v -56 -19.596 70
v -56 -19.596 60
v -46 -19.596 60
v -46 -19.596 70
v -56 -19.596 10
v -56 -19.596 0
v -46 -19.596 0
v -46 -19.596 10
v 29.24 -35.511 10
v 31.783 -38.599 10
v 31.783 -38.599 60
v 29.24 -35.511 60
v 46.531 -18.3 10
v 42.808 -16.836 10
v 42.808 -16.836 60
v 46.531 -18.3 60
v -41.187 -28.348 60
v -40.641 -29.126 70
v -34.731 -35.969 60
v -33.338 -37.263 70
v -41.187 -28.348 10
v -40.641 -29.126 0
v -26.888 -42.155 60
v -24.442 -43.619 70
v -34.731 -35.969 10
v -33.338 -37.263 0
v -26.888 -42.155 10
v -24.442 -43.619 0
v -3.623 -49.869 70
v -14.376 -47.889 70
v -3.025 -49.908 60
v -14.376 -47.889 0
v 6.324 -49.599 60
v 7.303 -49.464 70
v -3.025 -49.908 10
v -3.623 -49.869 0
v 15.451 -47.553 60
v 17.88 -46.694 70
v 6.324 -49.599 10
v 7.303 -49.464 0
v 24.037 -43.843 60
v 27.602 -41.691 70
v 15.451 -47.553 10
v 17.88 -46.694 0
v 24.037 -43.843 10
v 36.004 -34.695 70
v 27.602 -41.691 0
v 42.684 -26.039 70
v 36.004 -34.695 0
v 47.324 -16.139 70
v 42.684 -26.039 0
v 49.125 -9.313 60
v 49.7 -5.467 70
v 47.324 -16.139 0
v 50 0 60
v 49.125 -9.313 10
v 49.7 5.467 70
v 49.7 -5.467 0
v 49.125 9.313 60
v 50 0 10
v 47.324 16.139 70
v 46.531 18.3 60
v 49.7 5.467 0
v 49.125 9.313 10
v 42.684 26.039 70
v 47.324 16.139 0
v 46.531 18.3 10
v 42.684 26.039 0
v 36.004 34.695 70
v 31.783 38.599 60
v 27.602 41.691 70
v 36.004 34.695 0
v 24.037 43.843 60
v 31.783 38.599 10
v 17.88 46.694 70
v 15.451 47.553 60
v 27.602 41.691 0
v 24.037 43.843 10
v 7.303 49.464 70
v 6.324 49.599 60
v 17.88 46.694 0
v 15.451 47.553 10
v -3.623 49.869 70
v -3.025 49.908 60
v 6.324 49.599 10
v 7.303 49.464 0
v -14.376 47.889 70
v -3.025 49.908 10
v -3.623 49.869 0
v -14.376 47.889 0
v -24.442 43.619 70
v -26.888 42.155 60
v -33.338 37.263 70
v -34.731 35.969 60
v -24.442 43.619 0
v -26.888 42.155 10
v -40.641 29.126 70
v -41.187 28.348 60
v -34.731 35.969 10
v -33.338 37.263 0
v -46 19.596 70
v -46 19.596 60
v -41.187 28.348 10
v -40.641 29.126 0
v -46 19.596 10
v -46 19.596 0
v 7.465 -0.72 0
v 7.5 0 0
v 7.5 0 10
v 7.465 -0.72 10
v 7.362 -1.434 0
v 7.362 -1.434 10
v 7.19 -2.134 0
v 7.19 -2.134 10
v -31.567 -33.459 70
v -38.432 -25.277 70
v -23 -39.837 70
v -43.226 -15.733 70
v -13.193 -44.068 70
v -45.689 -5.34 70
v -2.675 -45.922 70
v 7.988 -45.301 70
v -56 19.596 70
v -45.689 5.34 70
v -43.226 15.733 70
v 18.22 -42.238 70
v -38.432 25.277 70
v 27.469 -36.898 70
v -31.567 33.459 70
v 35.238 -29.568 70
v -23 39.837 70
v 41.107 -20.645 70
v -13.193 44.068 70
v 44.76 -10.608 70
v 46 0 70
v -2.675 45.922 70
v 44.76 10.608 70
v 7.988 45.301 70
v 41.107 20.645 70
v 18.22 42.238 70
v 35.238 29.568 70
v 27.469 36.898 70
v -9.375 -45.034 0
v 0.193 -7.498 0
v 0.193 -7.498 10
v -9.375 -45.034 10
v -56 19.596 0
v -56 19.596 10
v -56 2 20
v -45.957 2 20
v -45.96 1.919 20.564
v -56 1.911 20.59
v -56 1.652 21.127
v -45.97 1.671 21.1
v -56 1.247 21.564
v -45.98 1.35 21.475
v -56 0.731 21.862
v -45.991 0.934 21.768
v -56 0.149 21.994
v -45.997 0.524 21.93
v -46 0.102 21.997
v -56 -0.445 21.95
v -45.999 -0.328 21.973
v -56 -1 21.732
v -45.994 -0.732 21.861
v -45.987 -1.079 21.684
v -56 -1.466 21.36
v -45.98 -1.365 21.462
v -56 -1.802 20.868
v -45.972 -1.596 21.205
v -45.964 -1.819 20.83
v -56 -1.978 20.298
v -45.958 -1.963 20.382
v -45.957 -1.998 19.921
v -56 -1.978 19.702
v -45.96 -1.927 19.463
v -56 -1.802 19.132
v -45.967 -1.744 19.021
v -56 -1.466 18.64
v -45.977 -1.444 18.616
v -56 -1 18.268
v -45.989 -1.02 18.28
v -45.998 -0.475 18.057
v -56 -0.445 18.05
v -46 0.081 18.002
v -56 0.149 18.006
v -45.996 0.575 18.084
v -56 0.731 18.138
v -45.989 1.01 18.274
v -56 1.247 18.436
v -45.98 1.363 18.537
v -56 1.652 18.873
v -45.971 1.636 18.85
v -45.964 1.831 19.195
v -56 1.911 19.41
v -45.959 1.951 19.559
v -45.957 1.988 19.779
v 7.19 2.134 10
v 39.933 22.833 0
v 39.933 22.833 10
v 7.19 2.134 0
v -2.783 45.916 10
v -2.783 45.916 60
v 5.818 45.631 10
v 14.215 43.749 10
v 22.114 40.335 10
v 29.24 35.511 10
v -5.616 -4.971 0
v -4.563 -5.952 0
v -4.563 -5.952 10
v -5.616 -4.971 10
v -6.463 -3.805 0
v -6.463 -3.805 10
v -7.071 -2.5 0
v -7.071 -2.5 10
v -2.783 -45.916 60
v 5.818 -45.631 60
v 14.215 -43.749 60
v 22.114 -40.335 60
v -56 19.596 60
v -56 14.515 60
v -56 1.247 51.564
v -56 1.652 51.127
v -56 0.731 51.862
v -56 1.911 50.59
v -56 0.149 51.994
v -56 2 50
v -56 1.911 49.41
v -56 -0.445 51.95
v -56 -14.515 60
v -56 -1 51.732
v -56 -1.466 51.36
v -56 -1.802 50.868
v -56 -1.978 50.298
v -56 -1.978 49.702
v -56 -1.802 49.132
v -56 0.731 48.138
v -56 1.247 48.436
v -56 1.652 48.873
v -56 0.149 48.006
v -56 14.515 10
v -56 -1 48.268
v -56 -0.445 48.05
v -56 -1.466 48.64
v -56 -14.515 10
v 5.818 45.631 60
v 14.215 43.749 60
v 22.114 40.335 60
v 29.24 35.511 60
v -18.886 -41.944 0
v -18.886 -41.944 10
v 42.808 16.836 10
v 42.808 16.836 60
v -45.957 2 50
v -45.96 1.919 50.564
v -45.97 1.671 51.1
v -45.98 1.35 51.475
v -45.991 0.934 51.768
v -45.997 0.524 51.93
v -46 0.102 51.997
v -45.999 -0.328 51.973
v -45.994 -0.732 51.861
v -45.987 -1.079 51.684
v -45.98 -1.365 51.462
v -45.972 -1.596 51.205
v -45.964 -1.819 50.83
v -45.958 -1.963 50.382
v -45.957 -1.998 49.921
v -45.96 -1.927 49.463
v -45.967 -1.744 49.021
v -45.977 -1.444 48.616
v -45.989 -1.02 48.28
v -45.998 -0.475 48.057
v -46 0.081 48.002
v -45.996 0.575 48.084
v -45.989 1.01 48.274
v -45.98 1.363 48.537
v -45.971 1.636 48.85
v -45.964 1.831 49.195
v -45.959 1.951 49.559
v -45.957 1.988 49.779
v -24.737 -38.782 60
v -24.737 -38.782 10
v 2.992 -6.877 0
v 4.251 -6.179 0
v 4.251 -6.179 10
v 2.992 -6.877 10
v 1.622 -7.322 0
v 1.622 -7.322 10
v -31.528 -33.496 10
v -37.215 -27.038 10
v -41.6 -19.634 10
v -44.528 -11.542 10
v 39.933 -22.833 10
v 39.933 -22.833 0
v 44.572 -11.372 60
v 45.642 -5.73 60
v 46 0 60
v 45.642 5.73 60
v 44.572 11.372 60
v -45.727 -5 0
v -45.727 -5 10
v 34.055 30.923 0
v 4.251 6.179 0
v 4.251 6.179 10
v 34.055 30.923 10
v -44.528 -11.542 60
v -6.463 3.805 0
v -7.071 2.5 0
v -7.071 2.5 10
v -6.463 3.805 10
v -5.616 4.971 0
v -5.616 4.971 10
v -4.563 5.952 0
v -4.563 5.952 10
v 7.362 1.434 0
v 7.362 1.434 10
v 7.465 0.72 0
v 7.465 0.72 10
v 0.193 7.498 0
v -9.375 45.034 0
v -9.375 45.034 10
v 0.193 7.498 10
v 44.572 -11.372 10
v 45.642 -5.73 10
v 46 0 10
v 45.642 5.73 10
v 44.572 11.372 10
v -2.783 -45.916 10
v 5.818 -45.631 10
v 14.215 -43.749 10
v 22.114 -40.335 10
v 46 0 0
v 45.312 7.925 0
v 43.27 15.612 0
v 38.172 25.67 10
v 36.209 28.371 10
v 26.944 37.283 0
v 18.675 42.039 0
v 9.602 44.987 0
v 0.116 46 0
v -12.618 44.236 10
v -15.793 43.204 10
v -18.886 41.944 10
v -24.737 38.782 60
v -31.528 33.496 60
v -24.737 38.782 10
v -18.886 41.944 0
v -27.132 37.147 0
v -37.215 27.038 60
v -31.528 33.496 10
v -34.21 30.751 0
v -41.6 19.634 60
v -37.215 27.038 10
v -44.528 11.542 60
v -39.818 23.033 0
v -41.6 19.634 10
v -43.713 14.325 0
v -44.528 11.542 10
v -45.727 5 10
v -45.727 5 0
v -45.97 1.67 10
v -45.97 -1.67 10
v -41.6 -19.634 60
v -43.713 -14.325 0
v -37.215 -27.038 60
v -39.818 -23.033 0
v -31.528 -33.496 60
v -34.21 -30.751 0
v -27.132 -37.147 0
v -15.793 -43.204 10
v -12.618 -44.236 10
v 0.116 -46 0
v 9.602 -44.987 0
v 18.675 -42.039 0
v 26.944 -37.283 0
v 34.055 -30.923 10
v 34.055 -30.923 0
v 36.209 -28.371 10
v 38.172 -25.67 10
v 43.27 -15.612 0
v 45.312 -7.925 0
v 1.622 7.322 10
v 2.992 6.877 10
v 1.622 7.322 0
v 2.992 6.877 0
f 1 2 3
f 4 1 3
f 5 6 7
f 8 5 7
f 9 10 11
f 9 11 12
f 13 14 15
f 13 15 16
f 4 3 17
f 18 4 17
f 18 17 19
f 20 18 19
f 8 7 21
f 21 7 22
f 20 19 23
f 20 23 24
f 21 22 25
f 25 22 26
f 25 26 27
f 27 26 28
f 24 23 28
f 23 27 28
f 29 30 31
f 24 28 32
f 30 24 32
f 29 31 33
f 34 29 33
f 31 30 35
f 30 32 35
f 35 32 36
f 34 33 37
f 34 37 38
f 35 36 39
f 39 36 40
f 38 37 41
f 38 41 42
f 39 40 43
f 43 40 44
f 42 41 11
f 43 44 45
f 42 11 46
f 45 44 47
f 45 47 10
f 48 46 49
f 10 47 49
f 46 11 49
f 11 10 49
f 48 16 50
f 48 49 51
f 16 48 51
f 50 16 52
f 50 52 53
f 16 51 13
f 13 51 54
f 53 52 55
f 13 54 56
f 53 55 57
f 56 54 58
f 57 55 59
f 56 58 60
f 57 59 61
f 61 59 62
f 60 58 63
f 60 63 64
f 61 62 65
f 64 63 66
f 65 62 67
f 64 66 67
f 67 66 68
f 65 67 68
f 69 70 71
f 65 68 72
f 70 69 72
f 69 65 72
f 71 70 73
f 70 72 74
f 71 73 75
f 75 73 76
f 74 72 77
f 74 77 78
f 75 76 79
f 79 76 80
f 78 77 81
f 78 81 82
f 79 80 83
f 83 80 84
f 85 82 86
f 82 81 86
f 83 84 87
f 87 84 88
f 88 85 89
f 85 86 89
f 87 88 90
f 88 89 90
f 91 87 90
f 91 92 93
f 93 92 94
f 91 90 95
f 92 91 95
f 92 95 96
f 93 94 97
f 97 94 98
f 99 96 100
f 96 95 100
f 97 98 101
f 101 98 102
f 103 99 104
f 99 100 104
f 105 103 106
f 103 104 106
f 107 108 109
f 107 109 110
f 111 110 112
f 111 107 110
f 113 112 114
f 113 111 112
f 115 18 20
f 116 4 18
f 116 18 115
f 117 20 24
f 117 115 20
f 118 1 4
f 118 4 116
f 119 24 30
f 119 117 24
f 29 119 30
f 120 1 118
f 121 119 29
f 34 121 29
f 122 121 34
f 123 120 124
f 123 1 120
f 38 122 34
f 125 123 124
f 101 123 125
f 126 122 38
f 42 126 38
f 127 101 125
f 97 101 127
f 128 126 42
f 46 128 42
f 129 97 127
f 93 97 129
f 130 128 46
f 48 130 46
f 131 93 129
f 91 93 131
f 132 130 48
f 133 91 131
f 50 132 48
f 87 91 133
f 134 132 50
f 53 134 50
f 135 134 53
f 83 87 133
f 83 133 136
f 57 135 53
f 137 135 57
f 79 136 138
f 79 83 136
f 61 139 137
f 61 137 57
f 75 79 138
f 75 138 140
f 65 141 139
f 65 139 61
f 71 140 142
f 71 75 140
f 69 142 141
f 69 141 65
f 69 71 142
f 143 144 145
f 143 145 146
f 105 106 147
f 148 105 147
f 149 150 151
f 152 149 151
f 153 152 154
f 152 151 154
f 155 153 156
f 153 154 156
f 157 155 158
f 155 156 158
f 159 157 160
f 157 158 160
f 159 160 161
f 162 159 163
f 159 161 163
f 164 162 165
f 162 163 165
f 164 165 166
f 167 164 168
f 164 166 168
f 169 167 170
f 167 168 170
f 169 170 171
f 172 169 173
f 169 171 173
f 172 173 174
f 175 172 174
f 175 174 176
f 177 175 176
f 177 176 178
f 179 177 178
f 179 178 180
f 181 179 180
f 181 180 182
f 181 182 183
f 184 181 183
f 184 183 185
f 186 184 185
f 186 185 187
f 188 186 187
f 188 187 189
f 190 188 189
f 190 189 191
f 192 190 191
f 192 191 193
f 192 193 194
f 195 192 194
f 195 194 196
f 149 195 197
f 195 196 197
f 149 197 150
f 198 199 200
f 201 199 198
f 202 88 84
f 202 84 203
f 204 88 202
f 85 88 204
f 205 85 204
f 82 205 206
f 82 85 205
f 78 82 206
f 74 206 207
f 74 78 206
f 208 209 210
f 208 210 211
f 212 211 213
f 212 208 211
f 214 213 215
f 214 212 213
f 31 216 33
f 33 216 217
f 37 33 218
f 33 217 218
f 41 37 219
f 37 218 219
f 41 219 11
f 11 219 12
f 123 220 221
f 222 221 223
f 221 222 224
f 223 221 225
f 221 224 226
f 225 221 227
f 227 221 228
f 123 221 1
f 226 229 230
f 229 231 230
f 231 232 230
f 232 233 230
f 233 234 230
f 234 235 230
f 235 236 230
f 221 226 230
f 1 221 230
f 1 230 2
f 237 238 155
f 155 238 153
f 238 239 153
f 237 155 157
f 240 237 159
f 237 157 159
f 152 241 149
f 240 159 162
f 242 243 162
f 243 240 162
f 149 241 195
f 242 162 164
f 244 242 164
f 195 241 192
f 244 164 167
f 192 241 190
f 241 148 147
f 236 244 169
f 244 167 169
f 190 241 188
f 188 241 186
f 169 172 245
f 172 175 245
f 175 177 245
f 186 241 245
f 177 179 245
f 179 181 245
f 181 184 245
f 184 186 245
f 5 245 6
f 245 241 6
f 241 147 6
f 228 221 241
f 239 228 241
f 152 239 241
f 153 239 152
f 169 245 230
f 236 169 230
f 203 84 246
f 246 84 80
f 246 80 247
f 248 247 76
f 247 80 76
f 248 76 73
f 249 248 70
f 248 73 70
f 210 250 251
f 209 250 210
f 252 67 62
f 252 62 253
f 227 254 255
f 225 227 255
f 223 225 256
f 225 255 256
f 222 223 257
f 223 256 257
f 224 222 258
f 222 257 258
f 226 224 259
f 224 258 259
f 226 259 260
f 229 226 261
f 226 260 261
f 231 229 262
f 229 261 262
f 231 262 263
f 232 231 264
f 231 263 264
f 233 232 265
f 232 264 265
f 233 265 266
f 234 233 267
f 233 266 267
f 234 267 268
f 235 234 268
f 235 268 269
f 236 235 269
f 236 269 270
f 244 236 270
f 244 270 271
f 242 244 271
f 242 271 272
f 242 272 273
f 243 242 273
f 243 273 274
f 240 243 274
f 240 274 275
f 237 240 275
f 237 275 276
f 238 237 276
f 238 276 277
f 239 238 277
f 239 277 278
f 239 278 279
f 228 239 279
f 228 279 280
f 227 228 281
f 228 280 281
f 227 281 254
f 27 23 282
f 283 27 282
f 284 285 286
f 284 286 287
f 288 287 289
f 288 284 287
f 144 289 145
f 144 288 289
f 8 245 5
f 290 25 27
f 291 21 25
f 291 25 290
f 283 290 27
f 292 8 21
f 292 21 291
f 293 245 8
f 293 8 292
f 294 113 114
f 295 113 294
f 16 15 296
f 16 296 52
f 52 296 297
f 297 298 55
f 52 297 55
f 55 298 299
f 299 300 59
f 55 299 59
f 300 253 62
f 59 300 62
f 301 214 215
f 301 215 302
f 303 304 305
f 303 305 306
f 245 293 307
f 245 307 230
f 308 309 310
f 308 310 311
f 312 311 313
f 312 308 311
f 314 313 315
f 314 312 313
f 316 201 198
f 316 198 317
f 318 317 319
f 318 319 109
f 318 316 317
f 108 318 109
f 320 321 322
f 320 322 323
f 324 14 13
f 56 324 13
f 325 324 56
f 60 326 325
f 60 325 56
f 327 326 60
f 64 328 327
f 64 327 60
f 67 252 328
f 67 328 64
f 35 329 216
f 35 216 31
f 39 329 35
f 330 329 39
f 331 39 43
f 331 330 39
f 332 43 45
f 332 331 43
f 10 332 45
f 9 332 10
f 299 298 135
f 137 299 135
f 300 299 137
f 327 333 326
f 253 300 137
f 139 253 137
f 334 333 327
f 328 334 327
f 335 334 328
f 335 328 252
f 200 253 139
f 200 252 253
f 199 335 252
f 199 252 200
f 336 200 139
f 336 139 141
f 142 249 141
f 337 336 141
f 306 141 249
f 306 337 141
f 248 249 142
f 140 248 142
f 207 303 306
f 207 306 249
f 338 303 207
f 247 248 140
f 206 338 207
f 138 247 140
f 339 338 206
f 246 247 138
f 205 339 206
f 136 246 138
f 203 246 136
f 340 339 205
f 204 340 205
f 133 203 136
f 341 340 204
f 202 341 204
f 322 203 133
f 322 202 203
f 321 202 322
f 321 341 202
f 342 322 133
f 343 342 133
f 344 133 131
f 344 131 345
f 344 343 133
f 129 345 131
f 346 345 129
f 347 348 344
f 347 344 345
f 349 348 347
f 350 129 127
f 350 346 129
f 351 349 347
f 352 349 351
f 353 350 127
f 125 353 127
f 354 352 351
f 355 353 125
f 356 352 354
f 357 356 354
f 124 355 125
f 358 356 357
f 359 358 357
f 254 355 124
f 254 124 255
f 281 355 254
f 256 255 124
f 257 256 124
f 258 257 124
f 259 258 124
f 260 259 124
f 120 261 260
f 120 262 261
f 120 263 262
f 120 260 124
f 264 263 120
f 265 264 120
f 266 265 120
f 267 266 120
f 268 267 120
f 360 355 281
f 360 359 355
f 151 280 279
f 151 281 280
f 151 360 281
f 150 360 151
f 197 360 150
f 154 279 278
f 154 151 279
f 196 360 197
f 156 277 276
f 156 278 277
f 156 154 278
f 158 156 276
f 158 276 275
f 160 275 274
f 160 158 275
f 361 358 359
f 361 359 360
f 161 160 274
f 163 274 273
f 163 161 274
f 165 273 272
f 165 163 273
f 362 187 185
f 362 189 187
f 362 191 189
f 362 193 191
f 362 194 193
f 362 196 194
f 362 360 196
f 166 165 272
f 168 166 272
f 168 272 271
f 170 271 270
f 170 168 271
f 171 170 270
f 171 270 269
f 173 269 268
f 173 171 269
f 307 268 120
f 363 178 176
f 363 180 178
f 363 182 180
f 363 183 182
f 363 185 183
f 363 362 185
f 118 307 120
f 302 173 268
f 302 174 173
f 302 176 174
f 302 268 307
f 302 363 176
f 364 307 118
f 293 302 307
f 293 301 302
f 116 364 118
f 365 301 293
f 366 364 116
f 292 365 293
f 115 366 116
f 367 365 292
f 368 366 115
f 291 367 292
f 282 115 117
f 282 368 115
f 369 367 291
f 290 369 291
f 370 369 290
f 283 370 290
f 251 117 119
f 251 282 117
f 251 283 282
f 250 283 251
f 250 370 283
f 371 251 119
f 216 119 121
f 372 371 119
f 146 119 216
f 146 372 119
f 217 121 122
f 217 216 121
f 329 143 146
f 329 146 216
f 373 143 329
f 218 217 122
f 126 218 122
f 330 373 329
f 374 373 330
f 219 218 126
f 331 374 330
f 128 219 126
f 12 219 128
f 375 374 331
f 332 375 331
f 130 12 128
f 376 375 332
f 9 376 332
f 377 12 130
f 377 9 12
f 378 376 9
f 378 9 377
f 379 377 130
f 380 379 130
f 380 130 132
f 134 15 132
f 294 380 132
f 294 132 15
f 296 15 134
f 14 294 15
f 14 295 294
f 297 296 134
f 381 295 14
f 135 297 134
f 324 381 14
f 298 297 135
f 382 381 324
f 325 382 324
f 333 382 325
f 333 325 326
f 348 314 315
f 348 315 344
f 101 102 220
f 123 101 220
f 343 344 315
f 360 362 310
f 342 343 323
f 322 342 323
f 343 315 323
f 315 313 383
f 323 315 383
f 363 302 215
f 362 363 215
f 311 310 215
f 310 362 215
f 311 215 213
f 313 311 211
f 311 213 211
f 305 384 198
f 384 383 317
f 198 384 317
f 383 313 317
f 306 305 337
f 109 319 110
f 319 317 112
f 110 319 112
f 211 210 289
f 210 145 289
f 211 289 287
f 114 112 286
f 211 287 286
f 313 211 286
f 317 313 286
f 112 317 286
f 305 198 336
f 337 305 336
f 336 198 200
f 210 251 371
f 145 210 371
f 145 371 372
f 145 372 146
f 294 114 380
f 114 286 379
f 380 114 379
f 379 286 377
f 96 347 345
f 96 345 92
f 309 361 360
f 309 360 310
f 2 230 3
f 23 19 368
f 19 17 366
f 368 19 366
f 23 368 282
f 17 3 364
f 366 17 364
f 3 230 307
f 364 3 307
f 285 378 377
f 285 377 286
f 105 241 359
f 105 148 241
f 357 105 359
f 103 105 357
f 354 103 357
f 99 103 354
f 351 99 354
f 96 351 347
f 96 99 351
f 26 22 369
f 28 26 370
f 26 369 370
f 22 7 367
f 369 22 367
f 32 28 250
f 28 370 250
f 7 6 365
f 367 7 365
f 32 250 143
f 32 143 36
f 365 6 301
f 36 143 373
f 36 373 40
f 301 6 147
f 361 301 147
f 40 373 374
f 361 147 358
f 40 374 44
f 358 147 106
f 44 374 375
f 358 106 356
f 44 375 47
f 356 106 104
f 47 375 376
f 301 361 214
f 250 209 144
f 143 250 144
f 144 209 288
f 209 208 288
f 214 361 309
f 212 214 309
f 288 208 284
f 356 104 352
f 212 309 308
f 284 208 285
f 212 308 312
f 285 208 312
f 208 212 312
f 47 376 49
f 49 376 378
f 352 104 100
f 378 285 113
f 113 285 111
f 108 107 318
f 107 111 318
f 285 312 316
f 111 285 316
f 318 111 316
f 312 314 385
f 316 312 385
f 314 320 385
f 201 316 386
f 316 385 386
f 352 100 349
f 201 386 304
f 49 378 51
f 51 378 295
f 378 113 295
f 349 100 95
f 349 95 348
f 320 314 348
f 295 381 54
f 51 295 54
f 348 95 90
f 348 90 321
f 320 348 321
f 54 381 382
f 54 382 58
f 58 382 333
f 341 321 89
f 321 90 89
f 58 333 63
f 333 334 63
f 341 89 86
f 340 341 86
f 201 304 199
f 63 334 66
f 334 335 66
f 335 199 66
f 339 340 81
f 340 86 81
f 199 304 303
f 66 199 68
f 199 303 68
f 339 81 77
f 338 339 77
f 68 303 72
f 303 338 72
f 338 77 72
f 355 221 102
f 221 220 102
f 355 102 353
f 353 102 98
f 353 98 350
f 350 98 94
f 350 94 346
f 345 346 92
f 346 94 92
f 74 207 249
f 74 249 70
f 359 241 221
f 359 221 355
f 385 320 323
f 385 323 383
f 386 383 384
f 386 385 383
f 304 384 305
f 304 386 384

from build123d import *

# Parameters (mm, degrees)
F0_R     = 46
F1_DEPTH = 70
F3_DEPTH = 10
F6_DEPTH = 50
F7_R     = 2
F8_DEPTH = 56.001


with BuildPart() as f1:
    # F0 (on Top) → F1 (new body)
    with BuildSketch(Plane.XY):
        with BuildLine():
            Line((-56, -19.5959179423), (-46, -19.5959179423))
            ThreePointArc((-46, -19.5959179423), (50, 0), (-46, 19.5959179423))
            Line((-46, 19.5959179423), (-56, 19.5959179423))
            Line((-56, 19.5959179423), (-56, -19.5959179423))
        make_face()
        Circle(F0_R, mode=Mode.SUBTRACT)
    extrude(amount=F1_DEPTH)

    # F2 (on face) → F3 (join)
    with BuildSketch(Plane(origin=(0, 0, 0), x_dir=(1, 0, 0), z_dir=(0, 0, -1))):
        with BuildLine():
            ThreePointArc((7.1900771589, -2.1337268918), (7.4221148836, -1.0780587433), (7.5, 0))
            ThreePointArc((7.5, 0), (7.4221148836, 1.0780587433), (7.1900771589, 2.1337268918))
            ThreePointArc((7.1900771589, 2.1337268918), (6.0676274578, 4.4083893922), (4.2511508974, 6.1788118637))
            ThreePointArc((4.2511508974, 6.1788118637), (2.3176274578, 7.1329238722), (0.1925611685, 7.4975276056))
            ThreePointArc((0.1925611685, 7.4975276056), (-2.3176274578, 7.1329238722), (-4.562721413, 5.9524426337))
            ThreePointArc((-4.562721413, 5.9524426337), (-6.0676274578, 4.4083893922), (-7.0710678119, 2.5))
            ThreePointArc((-7.0710678119, 2.5), (-7.5, 0), (-7.0710678119, -2.5))
            ThreePointArc((-7.0710678119, -2.5), (-6.0676274578, -4.4083893922), (-4.562721413, -5.9524426337))
            ThreePointArc((-4.562721413, -5.9524426337), (-2.3176274578, -7.1329238722), (0.1925611685, -7.4975276056))
            ThreePointArc((0.1925611685, -7.4975276056), (2.3176274578, -7.1329238722), (4.2511508975, -6.1788118637))
            ThreePointArc((4.2511508975, -6.1788118637), (6.0676274578, -4.4083893922), (7.1900771589, -2.1337268918))
        make_face()
        with BuildLine():
            ThreePointArc((-7.0710678119, -2.5), (-7.5, 0), (-7.0710678119, 2.5))
            Line((-7.0710678119, 2.5), (-45.7274534607, 5))
            ThreePointArc((-45.7274534607, 5), (-46, 0), (-45.7274534607, -5))
            Line((-45.7274534607, -5), (-7.0710678119, -2.5))
        make_face()
        with BuildLine():
            ThreePointArc((-4.562721413, 5.9524426337), (-2.3176274578, 7.1329238722), (0.1925611685, 7.4975276056))
            Line((0.1925611685, 7.4975276056), (-9.3752776474, 45.0344775593))
            ThreePointArc((-9.3752776474, 45.0344775593), (-14.2147817412, 43.7485997496), (-18.8858428103, 41.9443076155))
            Line((-18.8858428103, 41.9443076155), (-4.562721413, 5.9524426337))
        make_face()
        with BuildLine():
            ThreePointArc((4.2511508974, 6.1788118637), (6.0676274578, 4.4083893922), (7.1900771589, 2.1337268918))
            Line((7.1900771589, 2.1337268918), (39.9332132207, 22.8328377972))
            ThreePointArc((39.9332132207, 22.8328377972), (37.2147817412, 27.0381216055), (34.0553606977, 30.923007741))
            Line((34.0553606977, 30.923007741), (4.2511508974, 6.1788118637))
        make_face()
        with BuildLine():
            Line((39.9332132207, -22.8328377972), (7.1900771589, -2.1337268918))
            ThreePointArc((7.1900771589, -2.1337268918), (6.0676274578, -4.4083893922), (4.2511508975, -6.1788118637))
            Line((4.2511508975, -6.1788118637), (34.0553606977, -30.923007741))
            ThreePointArc((34.0553606977, -30.923007741), (37.2147817413, -27.0381216054), (39.9332132207, -22.8328377972))
        make_face()
        with BuildLine():
            Line((-9.3752776474, -45.0344775593), (0.1925611685, -7.4975276056))
            ThreePointArc((0.1925611685, -7.4975276056), (-2.3176274578, -7.1329238722), (-4.562721413, -5.9524426337))
            Line((-4.562721413, -5.9524426337), (-18.8858428103, -41.9443076155))
            ThreePointArc((-18.8858428103, -41.9443076155), (-14.2147817412, -43.7485997496), (-9.3752776474, -45.0344775593))
        make_face()
    extrude(amount=-F3_DEPTH)

    # F5 (on offset) → F6 (cut)
    with BuildSketch(Plane.XY.offset(10)):
        with BuildLine():
            Line((42.8084260527, 16.8356365753), (42.8084260527, -16.8356365753))
            ThreePointArc((42.8084260527, -16.8356365753), (46, 0), (42.8084260527, 16.8356365753))
        make_face()
        with BuildLine():
            ThreePointArc((42.8084260527, 16.8356365753), (46, 0), (42.8084260527, -16.8356365753))
            Line((42.8084260527, -16.8356365753), (71.2177157402, -28.0084013939))
            ThreePointArc((71.2177157402, -28.0084013939), (76.5273388005, 0), (71.2177157402, 28.0084013939))
            Line((71.2177157402, 28.0084013939), (42.8084260527, 16.8356365753))
        make_face()
        with BuildLine():
            Line((-2.7831107182, 45.9157303626), (29.2401730236, 35.5107347368))
            Line((29.2401730236, 35.5107347368), (48.645057121, 59.0770006144))
            ThreePointArc((48.645057121, 59.0770006144), (23.6482482237, 72.781824241), (-4.6300881924, 76.3871446464))
            Line((-4.6300881924, 76.3871446464), (-2.7831107182, 45.9157303626))
        make_face()
        with BuildLine():
            Line((-44.5284830709, 11.5418454071), (-24.7370052871, 38.7824776081))
            Line((-24.7370052871, 38.7824776081), (-41.1534170548, 64.519995727))
            ThreePointArc((-41.1534170548, 64.519995727), (-61.9119176239, 44.9816411442), (-74.079267614, 19.2014503011))
            Line((-74.079267614, 19.2014503011), (-44.5284830709, 11.5418454071))
        make_face()
        with BuildLine():
            Line((-24.7370052871, -38.7824776081), (-44.5284830709, -11.5418454071))
            Line((-44.5284830709, -11.5418454071), (-74.079267614, -19.2014503011))
            ThreePointArc((-74.079267614, -19.2014503011), (-61.9119176239, -44.9816411442), (-41.1534170548, -64.519995727))
            Line((-41.1534170548, -64.519995727), (-24.7370052871, -38.7824776081))
        make_face()
        with BuildLine():
            Line((29.2401730236, -35.5107347368), (-2.7831107182, -45.9157303626))
            Line((-2.7831107182, -45.9157303626), (-4.6300881924, -76.3871446464))
            ThreePointArc((-4.6300881924, -76.3871446464), (23.6482482237, -72.781824241), (48.645057121, -59.0770006144))
            Line((48.645057121, -59.0770006144), (29.2401730236, -35.5107347368))
        make_face()
    extrude(amount=F6_DEPTH, mode=Mode.SUBTRACT)

    # F7 (on Right) → F8 (cut, through all)
    with BuildSketch(Plane.YZ):
        with Locations((0, 50)):
            Circle(F7_R)
        with Locations((0, 20)):
            Circle(F7_R)
    extrude(amount=-F8_DEPTH, mode=Mode.SUBTRACT)


solid = f1.part
